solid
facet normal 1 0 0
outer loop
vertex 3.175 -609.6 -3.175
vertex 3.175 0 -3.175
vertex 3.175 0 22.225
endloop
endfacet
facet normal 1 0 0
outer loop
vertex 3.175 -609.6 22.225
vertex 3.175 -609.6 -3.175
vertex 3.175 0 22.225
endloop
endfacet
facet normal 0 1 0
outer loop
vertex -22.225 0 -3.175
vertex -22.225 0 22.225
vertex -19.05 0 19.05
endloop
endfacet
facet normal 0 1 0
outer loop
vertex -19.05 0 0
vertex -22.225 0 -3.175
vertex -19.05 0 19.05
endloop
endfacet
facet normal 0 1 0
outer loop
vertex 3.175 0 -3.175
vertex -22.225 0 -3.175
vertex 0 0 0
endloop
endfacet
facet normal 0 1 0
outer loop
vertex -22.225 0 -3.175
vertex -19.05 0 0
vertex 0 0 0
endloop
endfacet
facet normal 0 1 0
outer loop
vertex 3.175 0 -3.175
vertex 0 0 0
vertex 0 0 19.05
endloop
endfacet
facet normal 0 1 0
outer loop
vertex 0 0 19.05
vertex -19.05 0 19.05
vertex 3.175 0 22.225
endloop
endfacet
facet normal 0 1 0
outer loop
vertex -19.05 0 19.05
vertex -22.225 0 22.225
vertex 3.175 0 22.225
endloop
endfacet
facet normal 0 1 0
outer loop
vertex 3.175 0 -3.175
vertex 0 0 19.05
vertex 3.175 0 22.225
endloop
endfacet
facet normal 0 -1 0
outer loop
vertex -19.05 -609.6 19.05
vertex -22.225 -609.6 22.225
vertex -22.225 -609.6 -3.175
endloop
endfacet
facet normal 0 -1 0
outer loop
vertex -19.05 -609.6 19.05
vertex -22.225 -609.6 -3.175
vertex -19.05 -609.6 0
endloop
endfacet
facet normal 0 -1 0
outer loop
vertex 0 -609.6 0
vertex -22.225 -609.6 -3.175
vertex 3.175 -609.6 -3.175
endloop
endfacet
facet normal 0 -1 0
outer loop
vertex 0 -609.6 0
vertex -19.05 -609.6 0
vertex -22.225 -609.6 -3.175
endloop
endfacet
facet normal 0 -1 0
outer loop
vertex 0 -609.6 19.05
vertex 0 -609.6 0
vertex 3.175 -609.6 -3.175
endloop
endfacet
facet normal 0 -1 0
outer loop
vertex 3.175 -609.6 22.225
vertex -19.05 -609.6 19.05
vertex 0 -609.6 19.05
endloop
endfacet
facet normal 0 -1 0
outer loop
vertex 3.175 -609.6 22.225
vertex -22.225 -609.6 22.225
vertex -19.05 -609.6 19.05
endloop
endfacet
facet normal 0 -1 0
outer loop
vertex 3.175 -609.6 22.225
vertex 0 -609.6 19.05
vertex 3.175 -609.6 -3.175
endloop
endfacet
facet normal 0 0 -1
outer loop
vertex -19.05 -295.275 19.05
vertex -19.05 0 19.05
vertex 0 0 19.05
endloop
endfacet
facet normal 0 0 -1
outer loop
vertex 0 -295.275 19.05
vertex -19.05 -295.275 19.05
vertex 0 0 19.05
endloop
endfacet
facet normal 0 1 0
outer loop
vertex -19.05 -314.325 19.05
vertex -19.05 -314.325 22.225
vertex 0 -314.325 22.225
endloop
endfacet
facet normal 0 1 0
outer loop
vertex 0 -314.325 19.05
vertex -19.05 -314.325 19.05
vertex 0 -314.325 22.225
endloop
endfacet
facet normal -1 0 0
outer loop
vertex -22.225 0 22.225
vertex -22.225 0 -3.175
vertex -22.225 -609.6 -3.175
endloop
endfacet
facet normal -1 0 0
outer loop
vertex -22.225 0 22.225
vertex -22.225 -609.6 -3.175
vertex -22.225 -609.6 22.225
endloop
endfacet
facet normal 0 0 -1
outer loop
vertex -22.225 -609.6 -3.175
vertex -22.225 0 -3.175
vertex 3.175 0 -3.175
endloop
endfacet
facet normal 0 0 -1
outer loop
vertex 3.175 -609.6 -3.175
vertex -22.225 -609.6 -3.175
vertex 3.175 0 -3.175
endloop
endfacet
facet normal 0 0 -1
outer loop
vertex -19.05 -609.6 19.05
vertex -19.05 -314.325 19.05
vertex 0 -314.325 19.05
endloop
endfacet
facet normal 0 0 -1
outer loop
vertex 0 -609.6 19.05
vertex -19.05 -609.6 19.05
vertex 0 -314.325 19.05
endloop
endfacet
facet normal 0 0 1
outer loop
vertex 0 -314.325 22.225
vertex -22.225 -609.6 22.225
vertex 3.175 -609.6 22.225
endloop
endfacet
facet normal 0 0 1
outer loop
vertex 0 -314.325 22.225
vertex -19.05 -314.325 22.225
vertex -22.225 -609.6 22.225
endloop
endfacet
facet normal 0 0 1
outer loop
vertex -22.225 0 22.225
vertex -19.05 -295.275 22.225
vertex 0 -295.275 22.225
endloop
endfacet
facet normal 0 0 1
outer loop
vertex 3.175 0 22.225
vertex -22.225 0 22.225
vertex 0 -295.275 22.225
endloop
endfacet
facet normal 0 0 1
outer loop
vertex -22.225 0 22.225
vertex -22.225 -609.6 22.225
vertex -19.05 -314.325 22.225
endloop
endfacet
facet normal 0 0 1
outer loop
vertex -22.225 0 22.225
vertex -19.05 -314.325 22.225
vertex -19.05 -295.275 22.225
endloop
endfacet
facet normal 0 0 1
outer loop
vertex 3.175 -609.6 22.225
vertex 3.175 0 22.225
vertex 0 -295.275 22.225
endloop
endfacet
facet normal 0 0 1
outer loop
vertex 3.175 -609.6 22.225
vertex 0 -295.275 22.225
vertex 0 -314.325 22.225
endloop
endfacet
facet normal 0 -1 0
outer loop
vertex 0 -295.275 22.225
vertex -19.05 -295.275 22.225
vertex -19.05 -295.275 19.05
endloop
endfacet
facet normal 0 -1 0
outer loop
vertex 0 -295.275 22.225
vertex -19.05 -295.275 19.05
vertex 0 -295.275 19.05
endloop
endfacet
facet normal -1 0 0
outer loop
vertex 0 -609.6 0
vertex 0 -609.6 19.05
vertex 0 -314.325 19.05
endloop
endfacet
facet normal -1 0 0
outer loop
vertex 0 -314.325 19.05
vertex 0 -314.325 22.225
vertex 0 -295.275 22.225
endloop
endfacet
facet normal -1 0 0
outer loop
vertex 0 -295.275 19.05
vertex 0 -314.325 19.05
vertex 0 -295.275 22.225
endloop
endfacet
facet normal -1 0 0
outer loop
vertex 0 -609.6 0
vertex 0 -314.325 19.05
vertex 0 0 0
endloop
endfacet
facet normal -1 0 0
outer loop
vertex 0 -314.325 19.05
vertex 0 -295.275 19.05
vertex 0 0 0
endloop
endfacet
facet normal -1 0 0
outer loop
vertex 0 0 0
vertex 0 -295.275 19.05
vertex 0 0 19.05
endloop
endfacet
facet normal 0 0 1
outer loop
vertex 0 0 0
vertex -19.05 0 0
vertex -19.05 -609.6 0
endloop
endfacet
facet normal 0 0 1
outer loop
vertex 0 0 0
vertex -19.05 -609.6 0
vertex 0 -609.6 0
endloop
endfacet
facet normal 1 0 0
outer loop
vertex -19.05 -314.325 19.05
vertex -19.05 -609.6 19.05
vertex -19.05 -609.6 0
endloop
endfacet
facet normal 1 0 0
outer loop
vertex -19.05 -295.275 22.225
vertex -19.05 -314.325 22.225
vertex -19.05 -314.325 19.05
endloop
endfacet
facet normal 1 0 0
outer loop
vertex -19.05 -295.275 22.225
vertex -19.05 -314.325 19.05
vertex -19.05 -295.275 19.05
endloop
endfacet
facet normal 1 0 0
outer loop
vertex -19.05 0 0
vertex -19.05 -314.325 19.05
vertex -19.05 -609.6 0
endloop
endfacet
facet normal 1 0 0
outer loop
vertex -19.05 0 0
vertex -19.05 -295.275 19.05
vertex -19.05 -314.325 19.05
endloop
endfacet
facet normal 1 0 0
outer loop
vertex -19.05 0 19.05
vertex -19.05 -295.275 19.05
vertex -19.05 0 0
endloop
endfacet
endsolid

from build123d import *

# Parameters (mm, degrees)
F0_W     = 25.4
F0_H     = 25.4
F0_W_2   = 19.05
F0_H_2   = 19.05
F1_DEPTH = 609.6
F2_W     = 19.05
F2_H     = 19.05
F3_DEPTH = 19.05


with BuildPart() as f1:
    # F0 (on Front) → F1 (new body)
    with BuildSketch(Plane.XZ):
        with Locations((-9.525, 9.525)):
            Rectangle(F0_W, F0_H)
        with Locations((-9.525, 9.525)):
            Rectangle(F0_W_2, F0_H_2, mode=Mode.SUBTRACT)
    extrude(amount=F1_DEPTH)

    # F2 (on face) → F3 (cut)
    with BuildSketch(Plane.XY.offset(22.225)):
        with Locations((-9.525, -304.8)):
            Rectangle(F2_W, F2_H)
    extrude(amount=-F3_DEPTH, mode=Mode.SUBTRACT)


solid = f1.part
